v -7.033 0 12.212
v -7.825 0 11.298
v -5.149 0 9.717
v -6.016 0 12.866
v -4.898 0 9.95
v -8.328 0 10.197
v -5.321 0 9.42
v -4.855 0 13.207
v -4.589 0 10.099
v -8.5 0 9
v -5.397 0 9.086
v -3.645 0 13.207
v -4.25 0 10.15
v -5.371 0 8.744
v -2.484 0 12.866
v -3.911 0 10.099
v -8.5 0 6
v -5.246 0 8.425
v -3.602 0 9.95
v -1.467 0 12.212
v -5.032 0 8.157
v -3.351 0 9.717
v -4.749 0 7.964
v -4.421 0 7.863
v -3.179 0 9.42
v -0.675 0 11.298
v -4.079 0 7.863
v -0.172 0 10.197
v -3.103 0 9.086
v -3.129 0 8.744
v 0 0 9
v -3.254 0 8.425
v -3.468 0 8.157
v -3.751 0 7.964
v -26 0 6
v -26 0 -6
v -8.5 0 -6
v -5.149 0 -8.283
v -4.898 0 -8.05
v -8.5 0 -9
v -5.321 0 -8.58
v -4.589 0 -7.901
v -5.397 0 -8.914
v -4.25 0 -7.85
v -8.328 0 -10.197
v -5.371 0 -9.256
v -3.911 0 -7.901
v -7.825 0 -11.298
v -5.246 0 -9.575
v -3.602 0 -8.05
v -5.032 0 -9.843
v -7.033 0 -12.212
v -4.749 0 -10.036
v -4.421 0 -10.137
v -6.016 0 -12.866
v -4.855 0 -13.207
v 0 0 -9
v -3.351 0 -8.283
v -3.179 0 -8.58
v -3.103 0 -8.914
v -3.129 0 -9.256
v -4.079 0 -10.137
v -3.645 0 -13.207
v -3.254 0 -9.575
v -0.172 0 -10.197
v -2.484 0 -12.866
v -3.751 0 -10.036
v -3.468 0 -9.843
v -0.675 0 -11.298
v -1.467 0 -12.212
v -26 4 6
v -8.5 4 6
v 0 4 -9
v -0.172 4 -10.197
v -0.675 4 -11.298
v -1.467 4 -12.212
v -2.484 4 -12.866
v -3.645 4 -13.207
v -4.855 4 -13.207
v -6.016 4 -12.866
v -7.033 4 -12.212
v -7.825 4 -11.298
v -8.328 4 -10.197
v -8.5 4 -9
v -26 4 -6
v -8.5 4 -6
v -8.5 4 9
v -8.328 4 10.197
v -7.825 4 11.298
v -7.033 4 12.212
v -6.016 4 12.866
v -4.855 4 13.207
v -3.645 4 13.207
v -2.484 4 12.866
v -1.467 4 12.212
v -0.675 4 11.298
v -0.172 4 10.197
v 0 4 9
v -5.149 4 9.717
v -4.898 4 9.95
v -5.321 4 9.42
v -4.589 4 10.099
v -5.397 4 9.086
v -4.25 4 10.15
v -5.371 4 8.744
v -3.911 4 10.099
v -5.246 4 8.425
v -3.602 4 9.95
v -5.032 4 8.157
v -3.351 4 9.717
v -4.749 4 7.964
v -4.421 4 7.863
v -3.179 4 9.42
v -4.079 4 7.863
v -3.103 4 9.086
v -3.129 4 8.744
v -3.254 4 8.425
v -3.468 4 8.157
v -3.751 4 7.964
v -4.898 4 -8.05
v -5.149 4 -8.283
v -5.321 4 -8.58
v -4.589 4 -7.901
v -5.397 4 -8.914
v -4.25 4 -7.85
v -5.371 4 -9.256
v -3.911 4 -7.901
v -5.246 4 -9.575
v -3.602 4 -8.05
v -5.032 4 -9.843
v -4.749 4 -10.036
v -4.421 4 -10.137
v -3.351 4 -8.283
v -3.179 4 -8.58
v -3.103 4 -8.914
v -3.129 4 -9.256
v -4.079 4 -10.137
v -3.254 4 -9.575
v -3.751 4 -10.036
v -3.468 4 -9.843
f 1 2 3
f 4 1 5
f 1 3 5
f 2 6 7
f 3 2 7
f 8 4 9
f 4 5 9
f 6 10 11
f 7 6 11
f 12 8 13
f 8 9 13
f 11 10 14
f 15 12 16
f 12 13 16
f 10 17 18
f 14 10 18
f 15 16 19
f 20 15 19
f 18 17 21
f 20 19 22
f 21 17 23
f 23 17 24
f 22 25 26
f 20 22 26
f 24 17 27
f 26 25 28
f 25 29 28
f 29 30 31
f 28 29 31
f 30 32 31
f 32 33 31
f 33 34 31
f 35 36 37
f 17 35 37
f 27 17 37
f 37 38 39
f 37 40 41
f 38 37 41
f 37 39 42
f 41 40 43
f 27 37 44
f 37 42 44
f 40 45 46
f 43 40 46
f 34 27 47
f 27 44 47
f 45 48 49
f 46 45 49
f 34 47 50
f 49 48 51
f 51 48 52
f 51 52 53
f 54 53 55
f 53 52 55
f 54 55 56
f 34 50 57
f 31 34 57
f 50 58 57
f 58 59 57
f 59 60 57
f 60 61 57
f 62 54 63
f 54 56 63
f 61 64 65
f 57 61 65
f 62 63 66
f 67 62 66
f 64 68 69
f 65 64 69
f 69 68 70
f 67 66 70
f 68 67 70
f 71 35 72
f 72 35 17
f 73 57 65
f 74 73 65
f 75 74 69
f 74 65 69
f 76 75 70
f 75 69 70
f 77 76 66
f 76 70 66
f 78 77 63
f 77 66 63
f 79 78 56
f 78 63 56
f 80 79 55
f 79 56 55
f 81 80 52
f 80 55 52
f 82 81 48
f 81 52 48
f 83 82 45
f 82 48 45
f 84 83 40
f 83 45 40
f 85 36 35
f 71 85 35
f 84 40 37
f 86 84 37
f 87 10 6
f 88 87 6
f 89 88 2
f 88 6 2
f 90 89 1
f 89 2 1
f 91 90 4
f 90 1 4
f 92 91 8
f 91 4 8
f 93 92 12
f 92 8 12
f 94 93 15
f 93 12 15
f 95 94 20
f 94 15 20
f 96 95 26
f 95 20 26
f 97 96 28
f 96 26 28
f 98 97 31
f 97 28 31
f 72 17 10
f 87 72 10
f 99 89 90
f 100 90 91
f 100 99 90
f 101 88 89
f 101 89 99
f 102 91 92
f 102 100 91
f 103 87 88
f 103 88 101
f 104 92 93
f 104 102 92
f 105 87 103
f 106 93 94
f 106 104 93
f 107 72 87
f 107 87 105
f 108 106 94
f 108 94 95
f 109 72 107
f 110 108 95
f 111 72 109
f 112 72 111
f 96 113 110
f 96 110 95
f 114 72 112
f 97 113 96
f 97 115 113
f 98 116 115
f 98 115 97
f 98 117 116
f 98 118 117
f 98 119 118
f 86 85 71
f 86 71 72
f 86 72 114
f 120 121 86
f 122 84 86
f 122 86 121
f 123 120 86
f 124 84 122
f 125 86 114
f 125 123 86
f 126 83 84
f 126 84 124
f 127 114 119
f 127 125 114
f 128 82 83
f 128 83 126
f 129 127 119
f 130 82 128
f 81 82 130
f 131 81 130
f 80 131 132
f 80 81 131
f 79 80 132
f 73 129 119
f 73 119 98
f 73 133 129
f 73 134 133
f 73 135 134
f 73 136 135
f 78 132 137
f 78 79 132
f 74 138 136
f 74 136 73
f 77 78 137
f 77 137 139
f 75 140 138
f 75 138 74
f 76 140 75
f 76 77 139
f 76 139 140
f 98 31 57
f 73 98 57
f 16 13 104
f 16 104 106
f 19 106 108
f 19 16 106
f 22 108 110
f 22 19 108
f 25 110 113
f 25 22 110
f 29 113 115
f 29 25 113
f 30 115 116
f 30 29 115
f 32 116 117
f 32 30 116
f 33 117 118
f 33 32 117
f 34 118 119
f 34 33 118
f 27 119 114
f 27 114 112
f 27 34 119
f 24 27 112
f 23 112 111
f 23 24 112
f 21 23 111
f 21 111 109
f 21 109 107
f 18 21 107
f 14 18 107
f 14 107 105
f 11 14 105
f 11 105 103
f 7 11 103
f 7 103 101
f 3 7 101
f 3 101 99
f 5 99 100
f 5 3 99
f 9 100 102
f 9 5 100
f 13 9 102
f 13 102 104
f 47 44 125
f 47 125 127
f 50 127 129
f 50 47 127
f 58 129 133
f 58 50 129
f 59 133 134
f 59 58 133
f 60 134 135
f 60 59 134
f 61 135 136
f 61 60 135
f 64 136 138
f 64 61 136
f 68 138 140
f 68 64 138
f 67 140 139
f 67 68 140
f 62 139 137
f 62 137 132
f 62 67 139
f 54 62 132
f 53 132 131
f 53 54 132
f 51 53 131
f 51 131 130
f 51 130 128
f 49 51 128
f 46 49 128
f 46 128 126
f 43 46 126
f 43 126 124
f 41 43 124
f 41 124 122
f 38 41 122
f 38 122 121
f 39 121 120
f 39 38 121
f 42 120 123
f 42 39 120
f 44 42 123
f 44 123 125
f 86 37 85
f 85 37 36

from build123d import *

# Parameters (mm, degrees)
ESBO_O1_R                = 1.15
RESSALTO_EXTRUS_O1_DEPTH = 4


with BuildPart() as part:
    # Esboço1 → Ressalto-extrusão1 (new body)
    with BuildSketch(Plane(origin=(0, 0, 0), x_dir=(1, 0, 0), z_dir=(0, 1, 0))):
        with BuildLine():
            Line((-8.5, 9), (-8.5, 6))
            Line((-8.5, 6), (-26, 6))
            Line((-26, 6), (-26, -6))
            Line((-26, -6), (-8.5, -6))
            Line((-8.5, -6), (-8.5, -9))
            ThreePointArc((-8.5, -9), (-4.25, -13.25), (0, -9))
            Line((0, -9), (0, 9))
            ThreePointArc((0, 9), (-4.25, 13.25), (-8.5, 9))
        make_face()
        with Locations(Location((-4.25, 9, 0), (0, 0, 270))):
            Circle(ESBO_O1_R, mode=Mode.SUBTRACT)
        with Locations(Location((-4.25, -9, 0), (0, 0, 270))):
            Circle(ESBO_O1_R, mode=Mode.SUBTRACT)
    extrude(amount=RESSALTO_EXTRUS_O1_DEPTH)


solid = part.part
